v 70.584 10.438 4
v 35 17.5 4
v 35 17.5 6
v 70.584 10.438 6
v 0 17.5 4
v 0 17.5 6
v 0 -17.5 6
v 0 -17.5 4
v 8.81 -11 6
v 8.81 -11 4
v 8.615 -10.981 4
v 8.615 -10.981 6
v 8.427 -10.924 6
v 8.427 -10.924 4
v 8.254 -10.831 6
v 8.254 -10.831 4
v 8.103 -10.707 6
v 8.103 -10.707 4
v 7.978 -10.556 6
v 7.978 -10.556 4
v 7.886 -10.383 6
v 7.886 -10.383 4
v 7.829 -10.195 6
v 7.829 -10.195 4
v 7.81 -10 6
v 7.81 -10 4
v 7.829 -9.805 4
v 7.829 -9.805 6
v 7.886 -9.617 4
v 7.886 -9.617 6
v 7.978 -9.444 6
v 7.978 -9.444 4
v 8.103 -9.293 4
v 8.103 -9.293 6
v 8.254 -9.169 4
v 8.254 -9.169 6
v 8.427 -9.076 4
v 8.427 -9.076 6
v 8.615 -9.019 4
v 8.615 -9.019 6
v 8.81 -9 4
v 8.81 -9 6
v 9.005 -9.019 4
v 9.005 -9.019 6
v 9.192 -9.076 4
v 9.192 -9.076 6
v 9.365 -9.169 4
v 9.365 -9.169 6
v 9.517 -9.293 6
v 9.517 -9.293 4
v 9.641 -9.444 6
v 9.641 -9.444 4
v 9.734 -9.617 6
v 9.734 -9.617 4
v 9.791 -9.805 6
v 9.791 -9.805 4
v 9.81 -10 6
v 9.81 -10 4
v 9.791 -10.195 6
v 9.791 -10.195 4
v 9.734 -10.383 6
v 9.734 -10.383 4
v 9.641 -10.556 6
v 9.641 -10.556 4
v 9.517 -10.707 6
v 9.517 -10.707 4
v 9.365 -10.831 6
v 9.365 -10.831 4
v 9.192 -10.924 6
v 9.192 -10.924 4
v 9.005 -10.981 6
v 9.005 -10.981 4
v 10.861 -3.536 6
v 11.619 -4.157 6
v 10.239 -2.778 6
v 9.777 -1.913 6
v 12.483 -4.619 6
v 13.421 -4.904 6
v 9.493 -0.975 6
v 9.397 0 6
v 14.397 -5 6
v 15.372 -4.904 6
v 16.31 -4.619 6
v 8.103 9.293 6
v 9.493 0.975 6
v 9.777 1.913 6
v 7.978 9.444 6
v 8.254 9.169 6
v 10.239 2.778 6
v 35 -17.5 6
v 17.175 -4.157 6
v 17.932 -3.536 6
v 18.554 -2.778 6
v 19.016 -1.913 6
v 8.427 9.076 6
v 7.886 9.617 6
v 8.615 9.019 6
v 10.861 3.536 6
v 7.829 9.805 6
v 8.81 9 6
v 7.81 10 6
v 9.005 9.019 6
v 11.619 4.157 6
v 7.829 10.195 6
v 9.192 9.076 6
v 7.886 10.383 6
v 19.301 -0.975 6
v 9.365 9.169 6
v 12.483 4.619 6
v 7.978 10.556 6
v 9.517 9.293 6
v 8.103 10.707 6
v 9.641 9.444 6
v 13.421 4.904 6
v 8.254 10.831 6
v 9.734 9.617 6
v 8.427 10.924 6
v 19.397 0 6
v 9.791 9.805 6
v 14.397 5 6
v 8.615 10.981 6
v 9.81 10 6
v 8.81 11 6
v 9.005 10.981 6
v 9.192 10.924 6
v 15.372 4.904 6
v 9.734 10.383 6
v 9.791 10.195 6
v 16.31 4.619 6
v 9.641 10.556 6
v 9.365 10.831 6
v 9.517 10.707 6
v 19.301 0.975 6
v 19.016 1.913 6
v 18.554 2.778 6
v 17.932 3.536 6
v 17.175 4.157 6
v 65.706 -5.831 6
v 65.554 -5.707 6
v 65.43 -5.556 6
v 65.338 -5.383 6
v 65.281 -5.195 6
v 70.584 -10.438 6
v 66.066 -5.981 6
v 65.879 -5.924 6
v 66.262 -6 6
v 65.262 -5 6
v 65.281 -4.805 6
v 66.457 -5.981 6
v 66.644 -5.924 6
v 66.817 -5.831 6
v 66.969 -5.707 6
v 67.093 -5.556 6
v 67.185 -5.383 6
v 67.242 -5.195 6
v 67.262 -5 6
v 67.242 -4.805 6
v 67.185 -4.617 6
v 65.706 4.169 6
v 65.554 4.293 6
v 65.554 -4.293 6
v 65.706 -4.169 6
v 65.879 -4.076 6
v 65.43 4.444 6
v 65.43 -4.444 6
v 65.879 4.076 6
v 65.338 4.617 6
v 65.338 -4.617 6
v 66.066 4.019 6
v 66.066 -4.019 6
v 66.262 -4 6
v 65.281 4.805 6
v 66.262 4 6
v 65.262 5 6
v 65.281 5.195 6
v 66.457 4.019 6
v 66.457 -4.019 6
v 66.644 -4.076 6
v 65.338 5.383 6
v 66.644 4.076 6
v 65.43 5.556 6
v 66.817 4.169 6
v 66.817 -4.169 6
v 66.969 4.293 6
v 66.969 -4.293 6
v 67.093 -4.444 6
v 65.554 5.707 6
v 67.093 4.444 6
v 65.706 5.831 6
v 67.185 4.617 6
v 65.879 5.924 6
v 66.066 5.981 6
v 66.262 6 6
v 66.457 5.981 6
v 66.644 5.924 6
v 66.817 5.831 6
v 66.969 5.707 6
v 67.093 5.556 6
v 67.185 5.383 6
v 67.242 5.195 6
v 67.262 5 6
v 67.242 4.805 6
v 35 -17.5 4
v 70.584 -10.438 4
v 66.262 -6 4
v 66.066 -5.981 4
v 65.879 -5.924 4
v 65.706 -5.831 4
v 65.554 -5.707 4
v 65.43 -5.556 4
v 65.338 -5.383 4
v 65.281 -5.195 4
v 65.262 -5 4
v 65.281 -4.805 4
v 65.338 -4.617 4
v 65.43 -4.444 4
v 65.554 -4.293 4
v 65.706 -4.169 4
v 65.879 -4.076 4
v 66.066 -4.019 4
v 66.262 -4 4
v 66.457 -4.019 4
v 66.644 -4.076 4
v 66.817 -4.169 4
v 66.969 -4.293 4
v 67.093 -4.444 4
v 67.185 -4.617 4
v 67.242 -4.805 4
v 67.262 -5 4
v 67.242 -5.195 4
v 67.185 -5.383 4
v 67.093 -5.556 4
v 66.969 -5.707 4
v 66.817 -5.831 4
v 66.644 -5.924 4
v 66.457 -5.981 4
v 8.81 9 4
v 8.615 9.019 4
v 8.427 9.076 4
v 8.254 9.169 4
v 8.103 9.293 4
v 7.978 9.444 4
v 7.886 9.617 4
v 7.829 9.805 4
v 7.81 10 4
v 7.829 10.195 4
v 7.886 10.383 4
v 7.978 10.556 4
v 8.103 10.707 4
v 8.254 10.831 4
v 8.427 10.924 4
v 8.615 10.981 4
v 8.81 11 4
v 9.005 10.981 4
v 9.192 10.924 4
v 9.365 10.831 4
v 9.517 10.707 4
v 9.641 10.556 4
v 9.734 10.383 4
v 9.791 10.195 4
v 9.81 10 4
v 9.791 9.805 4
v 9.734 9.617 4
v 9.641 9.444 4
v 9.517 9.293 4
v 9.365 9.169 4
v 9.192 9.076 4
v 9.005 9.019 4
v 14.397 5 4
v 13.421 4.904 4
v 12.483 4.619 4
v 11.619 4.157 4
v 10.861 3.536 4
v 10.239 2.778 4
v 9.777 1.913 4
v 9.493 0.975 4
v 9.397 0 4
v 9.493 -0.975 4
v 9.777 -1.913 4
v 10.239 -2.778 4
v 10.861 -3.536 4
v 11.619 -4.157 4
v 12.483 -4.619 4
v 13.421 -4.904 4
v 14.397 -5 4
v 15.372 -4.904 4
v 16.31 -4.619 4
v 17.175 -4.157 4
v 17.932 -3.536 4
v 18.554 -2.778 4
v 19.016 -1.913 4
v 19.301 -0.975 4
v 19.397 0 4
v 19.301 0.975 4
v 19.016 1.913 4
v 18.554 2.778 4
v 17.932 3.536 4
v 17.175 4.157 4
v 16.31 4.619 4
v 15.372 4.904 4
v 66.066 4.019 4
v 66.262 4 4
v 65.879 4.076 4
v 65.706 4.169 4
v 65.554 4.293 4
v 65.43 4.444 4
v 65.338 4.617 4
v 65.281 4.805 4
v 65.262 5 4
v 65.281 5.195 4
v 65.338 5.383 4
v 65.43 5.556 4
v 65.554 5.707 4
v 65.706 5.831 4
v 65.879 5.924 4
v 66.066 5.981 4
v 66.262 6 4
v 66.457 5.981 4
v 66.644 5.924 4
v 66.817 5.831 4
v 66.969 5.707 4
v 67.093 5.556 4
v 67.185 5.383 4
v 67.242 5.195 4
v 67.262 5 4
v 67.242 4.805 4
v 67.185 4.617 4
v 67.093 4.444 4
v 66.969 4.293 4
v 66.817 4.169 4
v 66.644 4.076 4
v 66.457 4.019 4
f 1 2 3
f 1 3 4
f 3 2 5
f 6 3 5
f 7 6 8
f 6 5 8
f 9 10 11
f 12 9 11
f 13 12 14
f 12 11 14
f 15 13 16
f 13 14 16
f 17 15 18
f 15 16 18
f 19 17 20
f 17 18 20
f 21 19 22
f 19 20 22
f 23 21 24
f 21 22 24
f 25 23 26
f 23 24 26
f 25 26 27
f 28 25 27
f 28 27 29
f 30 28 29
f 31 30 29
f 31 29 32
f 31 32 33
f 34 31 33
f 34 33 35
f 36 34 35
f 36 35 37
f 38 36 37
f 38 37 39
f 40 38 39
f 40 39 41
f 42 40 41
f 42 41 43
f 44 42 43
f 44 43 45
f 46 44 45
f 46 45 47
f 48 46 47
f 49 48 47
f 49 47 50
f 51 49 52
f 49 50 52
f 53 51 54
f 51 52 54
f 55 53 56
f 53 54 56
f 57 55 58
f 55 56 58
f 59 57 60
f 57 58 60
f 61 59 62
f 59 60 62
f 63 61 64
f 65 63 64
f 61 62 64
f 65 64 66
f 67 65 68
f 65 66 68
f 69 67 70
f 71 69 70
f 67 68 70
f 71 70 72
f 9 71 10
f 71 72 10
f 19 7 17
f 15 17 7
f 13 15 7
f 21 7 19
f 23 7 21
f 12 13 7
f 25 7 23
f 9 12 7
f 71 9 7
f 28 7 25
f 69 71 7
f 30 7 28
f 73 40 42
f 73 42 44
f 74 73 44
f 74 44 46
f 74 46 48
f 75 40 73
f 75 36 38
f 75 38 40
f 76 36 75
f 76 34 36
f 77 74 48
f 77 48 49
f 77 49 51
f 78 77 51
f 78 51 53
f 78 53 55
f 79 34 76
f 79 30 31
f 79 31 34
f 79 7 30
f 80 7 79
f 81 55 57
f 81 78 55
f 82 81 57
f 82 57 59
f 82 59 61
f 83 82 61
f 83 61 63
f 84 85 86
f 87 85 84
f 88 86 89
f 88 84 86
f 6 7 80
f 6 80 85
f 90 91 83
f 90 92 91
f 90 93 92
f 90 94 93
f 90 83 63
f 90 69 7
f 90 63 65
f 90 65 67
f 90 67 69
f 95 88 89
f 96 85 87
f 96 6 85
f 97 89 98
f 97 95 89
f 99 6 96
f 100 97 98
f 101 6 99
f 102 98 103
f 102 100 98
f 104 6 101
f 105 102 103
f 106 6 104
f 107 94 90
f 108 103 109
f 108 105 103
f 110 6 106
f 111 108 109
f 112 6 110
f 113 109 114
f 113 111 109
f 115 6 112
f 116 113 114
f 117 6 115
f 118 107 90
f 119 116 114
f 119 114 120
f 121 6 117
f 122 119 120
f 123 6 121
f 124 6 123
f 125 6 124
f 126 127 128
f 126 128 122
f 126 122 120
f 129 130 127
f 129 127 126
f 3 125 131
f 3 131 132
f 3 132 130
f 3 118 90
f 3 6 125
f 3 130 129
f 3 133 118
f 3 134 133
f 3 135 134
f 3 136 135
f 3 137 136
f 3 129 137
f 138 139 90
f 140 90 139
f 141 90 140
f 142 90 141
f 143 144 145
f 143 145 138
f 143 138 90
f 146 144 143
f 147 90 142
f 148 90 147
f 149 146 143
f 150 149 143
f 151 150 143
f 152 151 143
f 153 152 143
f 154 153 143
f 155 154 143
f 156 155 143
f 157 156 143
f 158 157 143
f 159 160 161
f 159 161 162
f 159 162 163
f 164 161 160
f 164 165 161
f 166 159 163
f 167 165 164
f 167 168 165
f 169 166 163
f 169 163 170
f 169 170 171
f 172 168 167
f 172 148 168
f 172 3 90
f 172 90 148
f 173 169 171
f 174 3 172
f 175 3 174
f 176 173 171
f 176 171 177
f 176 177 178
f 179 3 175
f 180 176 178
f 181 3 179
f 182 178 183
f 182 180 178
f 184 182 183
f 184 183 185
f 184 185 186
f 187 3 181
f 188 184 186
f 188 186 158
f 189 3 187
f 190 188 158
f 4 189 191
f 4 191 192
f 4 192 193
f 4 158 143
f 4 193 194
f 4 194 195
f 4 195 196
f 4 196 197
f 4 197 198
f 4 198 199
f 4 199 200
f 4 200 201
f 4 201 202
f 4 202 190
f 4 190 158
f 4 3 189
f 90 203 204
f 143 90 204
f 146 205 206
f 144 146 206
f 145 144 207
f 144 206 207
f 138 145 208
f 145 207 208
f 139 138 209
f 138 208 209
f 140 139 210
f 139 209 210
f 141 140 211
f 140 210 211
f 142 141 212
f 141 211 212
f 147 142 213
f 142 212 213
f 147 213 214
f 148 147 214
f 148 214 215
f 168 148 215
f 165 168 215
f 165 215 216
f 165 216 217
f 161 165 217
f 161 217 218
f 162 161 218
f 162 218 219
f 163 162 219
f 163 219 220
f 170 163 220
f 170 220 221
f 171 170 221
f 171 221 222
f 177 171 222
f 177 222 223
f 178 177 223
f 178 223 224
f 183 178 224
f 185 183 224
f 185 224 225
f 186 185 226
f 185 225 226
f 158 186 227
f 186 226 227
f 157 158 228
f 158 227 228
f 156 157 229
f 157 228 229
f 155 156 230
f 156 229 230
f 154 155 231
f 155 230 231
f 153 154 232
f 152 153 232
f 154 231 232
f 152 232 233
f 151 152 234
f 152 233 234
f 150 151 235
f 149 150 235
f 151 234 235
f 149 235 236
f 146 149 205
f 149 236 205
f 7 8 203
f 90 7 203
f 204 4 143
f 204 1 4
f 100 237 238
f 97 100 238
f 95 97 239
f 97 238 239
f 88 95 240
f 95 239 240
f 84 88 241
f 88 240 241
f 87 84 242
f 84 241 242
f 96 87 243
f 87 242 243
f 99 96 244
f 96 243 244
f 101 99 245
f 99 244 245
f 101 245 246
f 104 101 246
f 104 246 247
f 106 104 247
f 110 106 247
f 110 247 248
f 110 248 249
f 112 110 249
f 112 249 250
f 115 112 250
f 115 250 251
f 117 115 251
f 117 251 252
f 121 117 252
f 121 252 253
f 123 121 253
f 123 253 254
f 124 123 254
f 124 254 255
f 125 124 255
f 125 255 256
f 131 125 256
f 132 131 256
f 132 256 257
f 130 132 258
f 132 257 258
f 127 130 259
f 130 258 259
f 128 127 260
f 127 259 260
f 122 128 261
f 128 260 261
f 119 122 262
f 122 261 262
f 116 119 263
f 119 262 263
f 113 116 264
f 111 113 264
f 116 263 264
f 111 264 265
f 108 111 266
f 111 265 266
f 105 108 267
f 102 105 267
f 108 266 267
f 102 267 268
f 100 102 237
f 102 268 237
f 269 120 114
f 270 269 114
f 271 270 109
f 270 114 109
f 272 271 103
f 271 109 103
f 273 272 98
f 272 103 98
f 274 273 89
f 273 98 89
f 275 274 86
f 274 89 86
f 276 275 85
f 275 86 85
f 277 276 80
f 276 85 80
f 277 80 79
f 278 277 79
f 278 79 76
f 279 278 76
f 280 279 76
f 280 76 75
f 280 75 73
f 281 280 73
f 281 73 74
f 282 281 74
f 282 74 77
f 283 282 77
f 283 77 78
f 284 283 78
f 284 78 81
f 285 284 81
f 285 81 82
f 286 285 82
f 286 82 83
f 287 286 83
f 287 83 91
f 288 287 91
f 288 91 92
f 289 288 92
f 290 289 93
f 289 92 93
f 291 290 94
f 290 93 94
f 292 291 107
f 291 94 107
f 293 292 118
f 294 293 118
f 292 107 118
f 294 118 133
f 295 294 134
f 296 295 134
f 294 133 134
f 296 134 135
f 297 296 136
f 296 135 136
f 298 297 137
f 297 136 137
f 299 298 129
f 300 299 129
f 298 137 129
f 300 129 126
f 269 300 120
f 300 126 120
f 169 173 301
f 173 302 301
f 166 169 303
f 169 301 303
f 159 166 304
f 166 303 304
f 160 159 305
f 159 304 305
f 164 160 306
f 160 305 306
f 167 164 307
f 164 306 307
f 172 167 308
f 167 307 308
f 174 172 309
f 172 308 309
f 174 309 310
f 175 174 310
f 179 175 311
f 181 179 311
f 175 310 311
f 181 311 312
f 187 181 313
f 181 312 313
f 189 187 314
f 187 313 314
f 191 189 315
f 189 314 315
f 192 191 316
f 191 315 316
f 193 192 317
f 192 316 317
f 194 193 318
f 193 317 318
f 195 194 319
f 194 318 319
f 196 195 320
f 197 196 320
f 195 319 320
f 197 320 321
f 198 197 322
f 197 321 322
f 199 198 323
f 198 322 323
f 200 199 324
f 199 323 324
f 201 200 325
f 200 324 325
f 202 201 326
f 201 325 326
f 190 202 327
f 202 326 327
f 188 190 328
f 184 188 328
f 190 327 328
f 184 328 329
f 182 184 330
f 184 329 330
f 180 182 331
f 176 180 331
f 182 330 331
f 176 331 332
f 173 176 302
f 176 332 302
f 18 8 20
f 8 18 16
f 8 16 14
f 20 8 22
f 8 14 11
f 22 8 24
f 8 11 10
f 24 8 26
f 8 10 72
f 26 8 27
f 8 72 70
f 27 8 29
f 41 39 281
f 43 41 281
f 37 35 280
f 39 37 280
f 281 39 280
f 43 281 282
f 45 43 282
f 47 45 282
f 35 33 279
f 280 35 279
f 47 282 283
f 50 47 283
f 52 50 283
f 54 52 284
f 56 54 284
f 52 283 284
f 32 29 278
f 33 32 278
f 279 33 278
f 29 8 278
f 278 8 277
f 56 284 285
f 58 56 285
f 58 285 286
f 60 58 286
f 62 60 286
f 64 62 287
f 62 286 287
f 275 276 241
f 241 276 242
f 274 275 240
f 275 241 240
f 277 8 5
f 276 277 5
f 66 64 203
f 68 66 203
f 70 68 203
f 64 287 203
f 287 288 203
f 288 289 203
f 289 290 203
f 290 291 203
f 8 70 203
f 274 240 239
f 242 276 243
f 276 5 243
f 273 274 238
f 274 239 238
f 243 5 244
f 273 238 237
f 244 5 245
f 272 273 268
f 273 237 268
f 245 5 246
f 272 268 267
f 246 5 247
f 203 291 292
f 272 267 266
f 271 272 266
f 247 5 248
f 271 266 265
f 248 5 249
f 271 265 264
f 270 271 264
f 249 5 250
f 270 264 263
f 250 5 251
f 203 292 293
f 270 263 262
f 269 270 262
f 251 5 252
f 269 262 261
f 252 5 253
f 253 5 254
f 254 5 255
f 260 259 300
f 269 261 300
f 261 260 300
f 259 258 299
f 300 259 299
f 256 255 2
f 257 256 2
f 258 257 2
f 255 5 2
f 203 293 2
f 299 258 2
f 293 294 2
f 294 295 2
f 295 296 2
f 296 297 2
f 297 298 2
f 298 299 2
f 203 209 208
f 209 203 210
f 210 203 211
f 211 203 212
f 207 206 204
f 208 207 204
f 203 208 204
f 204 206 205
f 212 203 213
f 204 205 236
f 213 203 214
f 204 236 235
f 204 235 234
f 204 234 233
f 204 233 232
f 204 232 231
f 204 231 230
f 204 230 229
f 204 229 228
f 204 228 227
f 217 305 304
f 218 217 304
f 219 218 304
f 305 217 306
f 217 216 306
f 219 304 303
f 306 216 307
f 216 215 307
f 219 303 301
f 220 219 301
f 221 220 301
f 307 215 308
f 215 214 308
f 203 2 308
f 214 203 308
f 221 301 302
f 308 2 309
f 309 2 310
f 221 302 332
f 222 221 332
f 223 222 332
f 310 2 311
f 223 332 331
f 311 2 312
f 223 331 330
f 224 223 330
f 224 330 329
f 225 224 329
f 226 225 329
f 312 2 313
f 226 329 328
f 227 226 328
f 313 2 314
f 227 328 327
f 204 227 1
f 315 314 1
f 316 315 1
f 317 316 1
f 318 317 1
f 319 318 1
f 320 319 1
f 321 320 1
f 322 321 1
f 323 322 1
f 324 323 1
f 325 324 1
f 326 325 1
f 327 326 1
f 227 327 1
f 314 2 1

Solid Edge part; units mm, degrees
sketch "Sketch1" plane through (0, 0, 4) normal (0, 0, 1) x (1, 0, 0)
  line L0 (0, 17.5) -> (0, -17.5)
  line L1 (0, -17.5) -> (35, -17.5)
  line L2 (35, -17.5) -> (70.5843, -10.4379)
  line L3 (70.5843, 10.4379) -> (70.5843, -10.4379)
  line L4 (35, 17.5) -> (70.5843, 10.4379)
  line L5 (35, 17.5) -> (0, 17.5)
  dimension "D1" = 35
  dimension "D2" = 35
extrude "ExtrudedProtrusion_1" add sketch "Sketch1" along normal blind 2
sketch "Sketch2" plane through (38.9148, 0, 6) normal (0, 0, 1) x (0, 1, 0)
  circle A0 centre (0, 24.5181) radius 5
extrude "Cutout1" cut sketch "Sketch2" against normal through all
sketch "Sketch3" plane through (35.2922, 0, 4) normal (0, 0, -1) x (0, -1, 0)
  circle A0 centre (10, 26.4824) radius 1
  circle A1 centre (-5, -30.9693) radius 1
  circle A2 centre (5, -30.9693) radius 1
  circle A3 centre (-10, 26.4824) radius 1
  dimension "D1" = 10
  dimension "D2" = 10
  dimension "D3" = 5
  dimension "D4" = 5
extrude "Cutout2" cut sketch "Sketch3" against normal through all
properties material "Polypropylene, high impact"
